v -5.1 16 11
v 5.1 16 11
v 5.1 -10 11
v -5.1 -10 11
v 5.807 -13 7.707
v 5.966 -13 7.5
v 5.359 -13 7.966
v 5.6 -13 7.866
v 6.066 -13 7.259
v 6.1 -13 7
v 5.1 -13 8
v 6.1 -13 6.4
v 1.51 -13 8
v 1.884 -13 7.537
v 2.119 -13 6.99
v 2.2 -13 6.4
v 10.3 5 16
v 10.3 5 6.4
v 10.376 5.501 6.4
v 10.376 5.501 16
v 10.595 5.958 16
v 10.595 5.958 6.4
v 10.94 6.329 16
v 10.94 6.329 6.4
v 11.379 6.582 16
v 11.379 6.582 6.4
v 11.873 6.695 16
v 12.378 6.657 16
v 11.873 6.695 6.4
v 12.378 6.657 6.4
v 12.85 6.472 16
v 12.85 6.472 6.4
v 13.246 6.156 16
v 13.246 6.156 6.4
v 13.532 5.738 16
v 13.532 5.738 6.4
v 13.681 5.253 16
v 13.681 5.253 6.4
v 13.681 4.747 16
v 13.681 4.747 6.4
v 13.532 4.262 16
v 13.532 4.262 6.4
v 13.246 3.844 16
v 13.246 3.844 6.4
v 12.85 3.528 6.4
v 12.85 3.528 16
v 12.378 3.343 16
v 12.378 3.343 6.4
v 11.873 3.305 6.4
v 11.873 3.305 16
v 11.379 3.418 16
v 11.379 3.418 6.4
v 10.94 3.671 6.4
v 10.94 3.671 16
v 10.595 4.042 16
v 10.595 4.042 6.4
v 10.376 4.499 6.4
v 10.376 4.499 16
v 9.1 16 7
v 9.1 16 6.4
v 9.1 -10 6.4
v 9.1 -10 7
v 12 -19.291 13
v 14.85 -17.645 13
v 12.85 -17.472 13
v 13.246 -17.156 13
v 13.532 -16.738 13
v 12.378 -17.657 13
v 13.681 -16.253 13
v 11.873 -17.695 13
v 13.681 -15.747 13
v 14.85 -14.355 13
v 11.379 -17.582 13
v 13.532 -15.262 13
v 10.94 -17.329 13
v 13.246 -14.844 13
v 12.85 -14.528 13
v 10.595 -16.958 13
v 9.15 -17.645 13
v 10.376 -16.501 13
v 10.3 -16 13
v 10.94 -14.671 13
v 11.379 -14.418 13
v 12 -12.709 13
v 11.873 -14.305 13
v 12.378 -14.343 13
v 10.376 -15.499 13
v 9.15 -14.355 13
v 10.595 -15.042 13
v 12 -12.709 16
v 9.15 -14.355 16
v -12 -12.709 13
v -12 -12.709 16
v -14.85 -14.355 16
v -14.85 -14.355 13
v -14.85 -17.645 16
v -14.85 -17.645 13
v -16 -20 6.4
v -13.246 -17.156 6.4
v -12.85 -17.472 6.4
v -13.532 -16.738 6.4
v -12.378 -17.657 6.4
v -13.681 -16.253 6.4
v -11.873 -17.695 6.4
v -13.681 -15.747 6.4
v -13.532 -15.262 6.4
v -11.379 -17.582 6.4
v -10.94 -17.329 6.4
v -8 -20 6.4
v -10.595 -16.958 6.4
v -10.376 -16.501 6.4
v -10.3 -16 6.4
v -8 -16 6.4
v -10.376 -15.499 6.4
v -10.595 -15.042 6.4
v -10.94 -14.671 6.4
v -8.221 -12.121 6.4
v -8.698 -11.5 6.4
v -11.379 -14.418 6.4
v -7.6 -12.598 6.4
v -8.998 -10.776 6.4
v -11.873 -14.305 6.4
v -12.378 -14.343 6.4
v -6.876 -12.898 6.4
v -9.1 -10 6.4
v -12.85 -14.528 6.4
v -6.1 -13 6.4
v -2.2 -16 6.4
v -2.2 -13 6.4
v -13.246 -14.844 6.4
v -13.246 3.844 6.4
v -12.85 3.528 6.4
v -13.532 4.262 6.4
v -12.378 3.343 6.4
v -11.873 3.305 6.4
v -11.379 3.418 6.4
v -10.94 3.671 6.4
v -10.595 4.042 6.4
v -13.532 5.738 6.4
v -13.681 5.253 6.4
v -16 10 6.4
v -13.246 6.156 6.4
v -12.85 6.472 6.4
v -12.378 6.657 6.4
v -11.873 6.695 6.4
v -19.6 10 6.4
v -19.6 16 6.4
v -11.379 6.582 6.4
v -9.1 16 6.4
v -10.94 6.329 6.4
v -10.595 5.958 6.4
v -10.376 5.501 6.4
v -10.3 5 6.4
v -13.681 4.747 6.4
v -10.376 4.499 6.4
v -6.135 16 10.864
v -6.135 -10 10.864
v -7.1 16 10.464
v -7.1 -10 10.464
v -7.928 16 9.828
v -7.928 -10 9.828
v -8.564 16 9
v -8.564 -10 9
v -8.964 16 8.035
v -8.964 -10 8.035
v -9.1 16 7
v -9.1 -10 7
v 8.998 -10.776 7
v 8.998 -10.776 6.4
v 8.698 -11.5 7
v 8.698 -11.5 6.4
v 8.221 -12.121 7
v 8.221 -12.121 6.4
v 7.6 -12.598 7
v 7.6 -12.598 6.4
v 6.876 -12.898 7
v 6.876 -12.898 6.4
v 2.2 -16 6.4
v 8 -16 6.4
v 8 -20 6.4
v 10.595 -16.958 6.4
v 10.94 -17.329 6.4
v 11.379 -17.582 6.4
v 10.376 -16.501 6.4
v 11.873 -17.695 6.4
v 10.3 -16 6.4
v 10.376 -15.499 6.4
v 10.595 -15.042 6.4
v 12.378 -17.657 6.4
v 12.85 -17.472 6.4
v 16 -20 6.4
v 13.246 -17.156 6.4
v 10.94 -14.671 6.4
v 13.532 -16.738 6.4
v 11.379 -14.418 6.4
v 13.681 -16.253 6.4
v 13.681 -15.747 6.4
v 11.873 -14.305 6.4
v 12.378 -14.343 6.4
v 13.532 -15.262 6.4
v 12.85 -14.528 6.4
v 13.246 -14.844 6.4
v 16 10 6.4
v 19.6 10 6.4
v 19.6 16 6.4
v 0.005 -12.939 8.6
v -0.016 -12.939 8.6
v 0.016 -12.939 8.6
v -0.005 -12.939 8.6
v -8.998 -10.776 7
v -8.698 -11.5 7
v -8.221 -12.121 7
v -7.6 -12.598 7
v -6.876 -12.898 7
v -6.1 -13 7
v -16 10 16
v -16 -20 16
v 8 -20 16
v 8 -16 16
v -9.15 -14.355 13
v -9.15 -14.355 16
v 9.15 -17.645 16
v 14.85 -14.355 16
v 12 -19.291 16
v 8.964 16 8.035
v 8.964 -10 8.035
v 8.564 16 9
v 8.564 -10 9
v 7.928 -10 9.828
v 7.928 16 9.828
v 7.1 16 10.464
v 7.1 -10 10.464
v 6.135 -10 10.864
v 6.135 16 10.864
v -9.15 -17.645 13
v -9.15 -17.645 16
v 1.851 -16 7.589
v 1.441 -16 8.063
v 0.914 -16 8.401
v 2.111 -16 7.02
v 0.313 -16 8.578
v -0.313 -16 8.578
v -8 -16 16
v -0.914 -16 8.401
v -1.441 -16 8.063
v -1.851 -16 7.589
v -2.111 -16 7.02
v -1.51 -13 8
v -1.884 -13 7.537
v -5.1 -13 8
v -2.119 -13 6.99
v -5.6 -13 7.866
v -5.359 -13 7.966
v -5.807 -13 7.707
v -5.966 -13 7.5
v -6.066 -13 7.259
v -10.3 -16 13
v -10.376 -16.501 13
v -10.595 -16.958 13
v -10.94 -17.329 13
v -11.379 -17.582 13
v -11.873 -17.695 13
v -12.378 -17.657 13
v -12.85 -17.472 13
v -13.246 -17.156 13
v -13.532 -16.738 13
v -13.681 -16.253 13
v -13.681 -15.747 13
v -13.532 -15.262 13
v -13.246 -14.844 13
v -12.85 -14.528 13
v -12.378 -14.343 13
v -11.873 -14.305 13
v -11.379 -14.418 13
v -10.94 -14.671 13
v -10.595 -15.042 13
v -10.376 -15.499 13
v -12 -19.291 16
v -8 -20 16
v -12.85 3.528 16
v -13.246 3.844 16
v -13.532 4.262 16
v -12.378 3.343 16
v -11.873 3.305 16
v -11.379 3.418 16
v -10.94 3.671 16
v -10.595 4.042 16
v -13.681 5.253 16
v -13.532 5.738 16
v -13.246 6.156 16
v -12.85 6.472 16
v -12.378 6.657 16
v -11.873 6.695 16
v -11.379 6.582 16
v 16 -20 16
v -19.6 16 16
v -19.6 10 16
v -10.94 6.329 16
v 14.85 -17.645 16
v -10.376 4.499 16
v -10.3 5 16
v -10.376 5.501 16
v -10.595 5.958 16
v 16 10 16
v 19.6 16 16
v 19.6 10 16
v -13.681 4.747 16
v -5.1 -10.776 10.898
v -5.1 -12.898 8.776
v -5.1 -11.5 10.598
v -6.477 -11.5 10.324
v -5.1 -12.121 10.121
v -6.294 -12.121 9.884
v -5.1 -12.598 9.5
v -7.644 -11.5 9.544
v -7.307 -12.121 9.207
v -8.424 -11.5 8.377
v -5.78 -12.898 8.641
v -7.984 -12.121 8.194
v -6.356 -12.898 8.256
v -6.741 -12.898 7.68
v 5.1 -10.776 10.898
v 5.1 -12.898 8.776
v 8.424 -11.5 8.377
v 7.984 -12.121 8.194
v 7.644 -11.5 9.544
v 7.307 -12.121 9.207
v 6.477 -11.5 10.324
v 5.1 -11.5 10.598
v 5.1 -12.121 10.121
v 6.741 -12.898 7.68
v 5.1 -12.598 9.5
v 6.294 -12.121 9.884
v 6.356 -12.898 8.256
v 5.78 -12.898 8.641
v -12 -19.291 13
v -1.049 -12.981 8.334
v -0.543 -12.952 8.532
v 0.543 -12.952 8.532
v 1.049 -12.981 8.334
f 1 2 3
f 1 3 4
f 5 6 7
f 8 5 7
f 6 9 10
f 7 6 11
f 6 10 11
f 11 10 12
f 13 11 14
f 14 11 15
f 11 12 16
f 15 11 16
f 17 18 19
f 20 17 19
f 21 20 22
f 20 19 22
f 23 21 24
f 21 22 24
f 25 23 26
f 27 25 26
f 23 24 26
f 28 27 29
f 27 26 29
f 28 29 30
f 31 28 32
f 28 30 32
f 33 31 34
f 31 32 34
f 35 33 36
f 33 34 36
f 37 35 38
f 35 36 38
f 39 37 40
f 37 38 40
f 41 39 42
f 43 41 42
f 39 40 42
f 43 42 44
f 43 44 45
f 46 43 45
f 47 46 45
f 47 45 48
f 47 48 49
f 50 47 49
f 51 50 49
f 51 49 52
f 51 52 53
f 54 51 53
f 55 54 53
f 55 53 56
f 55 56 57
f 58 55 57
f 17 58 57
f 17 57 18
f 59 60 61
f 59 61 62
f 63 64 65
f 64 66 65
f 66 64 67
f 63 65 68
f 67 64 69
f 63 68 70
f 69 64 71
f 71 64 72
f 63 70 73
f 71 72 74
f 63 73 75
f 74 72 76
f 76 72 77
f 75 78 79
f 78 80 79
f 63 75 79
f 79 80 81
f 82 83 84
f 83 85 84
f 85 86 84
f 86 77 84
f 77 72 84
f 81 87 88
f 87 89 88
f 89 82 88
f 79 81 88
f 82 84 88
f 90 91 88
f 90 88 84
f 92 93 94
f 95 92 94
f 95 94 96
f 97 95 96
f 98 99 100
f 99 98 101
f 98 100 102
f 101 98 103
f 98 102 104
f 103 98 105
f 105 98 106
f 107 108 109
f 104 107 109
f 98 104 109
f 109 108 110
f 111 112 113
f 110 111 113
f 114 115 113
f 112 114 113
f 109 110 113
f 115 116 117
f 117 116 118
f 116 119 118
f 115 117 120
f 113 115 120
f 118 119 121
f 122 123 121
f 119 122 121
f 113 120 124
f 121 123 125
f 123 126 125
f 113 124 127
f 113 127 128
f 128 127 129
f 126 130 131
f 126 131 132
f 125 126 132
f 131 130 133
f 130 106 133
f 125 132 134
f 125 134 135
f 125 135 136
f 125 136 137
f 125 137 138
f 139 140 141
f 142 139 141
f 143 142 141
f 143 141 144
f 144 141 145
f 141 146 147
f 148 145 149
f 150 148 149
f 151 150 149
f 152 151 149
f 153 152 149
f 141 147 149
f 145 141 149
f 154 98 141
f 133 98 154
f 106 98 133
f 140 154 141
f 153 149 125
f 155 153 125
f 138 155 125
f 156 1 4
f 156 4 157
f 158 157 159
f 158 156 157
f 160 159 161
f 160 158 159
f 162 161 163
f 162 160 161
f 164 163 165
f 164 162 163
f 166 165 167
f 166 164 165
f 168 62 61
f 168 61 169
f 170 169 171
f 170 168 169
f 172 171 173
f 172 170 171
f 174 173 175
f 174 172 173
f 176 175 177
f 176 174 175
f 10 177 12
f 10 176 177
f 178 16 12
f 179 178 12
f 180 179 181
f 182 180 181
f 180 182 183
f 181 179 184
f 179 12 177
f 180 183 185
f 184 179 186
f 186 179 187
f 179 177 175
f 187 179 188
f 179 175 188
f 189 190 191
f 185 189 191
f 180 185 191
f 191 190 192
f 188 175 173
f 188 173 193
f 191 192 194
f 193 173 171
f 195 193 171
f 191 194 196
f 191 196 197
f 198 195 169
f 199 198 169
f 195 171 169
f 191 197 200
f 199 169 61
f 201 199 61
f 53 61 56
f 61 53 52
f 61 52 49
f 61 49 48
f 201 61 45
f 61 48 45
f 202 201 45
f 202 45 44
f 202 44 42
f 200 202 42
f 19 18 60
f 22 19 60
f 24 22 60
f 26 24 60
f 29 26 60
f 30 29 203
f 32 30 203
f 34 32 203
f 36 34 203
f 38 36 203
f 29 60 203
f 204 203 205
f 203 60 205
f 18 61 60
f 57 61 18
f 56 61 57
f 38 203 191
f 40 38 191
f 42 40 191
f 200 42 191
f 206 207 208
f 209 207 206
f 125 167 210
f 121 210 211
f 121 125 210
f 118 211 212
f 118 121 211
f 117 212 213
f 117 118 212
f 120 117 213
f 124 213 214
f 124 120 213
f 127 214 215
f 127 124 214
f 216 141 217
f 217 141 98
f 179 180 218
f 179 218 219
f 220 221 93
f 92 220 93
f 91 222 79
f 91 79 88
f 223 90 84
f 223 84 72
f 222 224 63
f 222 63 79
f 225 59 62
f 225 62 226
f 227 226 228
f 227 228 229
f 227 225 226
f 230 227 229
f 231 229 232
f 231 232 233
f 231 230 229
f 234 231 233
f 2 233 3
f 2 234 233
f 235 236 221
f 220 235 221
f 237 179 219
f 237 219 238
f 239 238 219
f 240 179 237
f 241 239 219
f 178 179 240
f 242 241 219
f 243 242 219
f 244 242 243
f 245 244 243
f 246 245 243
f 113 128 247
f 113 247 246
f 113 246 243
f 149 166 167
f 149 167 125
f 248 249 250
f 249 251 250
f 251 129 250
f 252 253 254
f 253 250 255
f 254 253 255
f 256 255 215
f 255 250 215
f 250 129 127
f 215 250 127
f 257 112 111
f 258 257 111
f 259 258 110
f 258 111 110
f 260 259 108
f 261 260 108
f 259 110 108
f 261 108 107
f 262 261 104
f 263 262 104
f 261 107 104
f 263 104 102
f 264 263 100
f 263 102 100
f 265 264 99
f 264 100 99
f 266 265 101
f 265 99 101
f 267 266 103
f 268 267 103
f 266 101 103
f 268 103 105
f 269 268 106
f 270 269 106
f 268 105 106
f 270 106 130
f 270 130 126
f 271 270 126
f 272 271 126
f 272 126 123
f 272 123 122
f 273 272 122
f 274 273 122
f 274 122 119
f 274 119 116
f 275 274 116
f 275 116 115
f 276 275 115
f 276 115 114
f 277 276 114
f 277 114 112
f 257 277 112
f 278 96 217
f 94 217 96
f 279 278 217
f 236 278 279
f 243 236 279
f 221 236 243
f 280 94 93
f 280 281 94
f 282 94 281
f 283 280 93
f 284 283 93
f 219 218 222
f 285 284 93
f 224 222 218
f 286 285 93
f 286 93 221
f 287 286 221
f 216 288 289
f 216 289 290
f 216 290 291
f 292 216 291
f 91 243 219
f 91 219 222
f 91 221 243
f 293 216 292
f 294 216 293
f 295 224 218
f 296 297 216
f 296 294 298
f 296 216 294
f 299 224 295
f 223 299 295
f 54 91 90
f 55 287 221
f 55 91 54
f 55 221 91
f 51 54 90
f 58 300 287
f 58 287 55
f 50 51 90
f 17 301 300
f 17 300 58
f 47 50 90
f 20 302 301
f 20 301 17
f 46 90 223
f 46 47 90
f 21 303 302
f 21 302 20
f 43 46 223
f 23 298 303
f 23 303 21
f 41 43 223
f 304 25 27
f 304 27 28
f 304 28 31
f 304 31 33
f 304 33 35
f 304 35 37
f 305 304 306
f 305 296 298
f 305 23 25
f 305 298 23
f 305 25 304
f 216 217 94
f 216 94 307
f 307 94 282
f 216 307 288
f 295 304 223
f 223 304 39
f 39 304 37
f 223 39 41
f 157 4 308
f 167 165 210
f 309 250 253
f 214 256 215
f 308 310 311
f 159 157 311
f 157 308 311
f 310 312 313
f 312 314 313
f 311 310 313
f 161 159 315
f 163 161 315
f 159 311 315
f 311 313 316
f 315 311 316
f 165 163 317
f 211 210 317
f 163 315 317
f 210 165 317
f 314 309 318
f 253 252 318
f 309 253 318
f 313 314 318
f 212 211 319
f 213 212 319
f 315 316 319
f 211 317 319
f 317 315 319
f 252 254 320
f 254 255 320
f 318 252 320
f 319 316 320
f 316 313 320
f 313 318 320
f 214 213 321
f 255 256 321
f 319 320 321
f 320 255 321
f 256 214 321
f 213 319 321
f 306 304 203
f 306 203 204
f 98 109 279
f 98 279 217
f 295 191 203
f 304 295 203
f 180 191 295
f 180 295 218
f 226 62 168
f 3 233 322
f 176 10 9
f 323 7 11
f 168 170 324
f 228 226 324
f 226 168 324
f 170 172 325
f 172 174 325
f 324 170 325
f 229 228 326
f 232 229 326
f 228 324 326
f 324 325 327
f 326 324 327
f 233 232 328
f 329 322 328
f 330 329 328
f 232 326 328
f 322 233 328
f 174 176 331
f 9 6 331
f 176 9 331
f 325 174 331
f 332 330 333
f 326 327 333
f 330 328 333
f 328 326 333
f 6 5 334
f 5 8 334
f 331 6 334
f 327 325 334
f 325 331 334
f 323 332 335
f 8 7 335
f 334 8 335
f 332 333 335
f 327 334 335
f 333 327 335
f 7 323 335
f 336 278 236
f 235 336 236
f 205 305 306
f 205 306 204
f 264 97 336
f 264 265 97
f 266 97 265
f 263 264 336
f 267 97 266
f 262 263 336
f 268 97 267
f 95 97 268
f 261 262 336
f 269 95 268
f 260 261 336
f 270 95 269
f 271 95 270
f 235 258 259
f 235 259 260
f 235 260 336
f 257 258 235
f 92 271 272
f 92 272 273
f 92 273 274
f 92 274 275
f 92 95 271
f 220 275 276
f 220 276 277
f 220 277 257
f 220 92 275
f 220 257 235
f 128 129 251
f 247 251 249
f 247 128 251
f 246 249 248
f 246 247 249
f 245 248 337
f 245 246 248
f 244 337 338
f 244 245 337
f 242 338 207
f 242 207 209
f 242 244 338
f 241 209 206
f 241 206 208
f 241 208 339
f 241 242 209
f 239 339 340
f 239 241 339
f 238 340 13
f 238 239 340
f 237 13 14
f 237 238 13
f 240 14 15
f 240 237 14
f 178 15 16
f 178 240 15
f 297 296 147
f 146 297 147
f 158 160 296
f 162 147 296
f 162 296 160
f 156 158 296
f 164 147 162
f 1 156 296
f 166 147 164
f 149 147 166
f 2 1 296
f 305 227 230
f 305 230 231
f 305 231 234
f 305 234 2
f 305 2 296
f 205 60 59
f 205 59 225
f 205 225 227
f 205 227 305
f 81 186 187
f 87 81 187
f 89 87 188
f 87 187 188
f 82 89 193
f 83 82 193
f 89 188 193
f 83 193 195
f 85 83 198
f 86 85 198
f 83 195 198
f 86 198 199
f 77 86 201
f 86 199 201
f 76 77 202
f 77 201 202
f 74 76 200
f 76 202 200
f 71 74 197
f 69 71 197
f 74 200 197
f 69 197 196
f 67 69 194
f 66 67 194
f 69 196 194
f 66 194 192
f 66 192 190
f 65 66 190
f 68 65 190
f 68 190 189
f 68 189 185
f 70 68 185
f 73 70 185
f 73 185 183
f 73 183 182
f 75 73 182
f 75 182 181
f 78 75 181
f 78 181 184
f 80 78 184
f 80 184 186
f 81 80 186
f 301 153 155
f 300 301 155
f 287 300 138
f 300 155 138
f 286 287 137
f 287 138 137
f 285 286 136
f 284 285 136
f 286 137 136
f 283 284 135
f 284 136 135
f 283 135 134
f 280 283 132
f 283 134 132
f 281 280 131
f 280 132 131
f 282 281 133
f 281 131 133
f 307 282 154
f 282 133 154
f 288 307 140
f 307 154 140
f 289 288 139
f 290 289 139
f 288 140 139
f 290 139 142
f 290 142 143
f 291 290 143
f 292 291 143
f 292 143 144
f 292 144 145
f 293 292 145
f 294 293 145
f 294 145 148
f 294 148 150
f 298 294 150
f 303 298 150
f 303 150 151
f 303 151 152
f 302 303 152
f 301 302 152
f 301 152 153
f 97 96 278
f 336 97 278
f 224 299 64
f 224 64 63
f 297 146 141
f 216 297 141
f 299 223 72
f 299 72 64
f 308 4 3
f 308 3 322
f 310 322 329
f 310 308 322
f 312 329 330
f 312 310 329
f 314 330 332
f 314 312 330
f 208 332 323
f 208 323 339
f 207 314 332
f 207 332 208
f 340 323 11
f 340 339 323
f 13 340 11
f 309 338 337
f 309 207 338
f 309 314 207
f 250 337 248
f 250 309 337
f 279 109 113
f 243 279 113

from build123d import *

# Parameters (mm, degrees)
EXTRUDE_1_DEPTH     = 16
CUT_EXTRUDE_1_DEPTH = 29
FILLET_1_R          = 3
SKETCH_3_R          = 1.7
CUT_EXTRUDE_2_DEPTH = 16
SKETCH_4_R          = 2.2
CUT_EXTRUDE_3_DEPTH = 3.0606
CUT_EXTRUDE_4_DEPTH = 3
EXTRUDE_START       = 13
SKETCH_6_W          = 8
SKETCH_6_H          = 8
SKETCH_6_R          = 1.7
EXTRUDE_2_DEPTH     = 13
SKETCH_8_W          = 39.2
SKETCH_8_H          = 19.2
EXTRUDE_3_DEPTH     = 6
SKETCH_9_W          = 41.779638264
SKETCH_9_H          = 22.131707322
CUT_EXTRUDE_5_DEPTH = 45.001818144


with BuildPart() as part:
    # Эскиз1 → Бобышка-Вытянуть1 (new body)
    with BuildSketch(Plane.XY):
        Polygon((8, -16), (-8, -16), (-8, -20), (-16, -20), (-16, -16), (-16, 16), (16, 16), (16, -16), (16, -20), (8, -20), align=None)
    extrude(amount=EXTRUDE_1_DEPTH)

    # Эскиз2 → Вырез-Вытянуть1 (cut)
    with BuildSketch(Plane(origin=(0, 16, 0), x_dir=(1, 0, 0), z_dir=(0, 1, 0))):
        with BuildLine():
            Line((5.1, -11), (-5.1, -11))
            ThreePointArc((-5.1, -11), (-7.928427125, -9.828427125), (-9.1, -7))
            Line((-9.1, -7), (-9.1, -5.8))
            ThreePointArc((-9.1, -5.8), (-7.928427125, -2.971572875), (-5.1, -1.8))
            Line((-5.1, -1.8), (5.1, -1.8))
            ThreePointArc((5.1, -1.8), (7.928427125, -2.971572875), (9.1, -5.8))
            Line((9.1, -5.8), (9.1, -7))
            ThreePointArc((9.1, -7), (7.928427125, -9.828427125), (5.1, -11))
        make_face()
    extrude(amount=-CUT_EXTRUDE_1_DEPTH, mode=Mode.SUBTRACT)

    # Скругление1
    fillet_1_edges = [part.edges().sort_by_distance(p)[0] for p in [
        (7.928427125, -13, 2.971572875),
        (9.1, -13, 6.4),
        (7.928427125, -13, 9.828427125),
        (0, -13, 11),
        (-7.928427125, -13, 9.828427125),
        (-9.1, -13, 6.4),
        (-7.928427125, -13, 2.971572875),
        (0, -13, 1.8),
    ]]
    fillet(fillet_1_edges, radius=FILLET_1_R)

    # Эскиз3 → Вырез-Вытянуть2 (cut)
    with BuildSketch(Plane(origin=(0, 0, 0), x_dir=(-1, 0, 0), z_dir=(0, 0, -1))):
        with Locations((-12, -16)):
            Circle(SKETCH_3_R)
        with Locations((-12, 5)):
            Circle(SKETCH_3_R)
        with Locations(Location((12, 5, 0), (0, 0, 180))):
            Circle(SKETCH_3_R)
        with Locations(Location((12, -16, 0), (0, 0, 180))):
            Circle(SKETCH_3_R)
    extrude(amount=-CUT_EXTRUDE_2_DEPTH, mode=Mode.SUBTRACT)

    # Эскиз4 → Вырез-Вытянуть3 (cut)
    with BuildSketch(Plane(origin=(0, -16, 0), x_dir=(1, 0, 0), z_dir=(0, 1, 0))):
        with Locations(Location((0, -6.4, 0), (0, 0, 133.341758227))):
            Circle(SKETCH_4_R)
    extrude(amount=CUT_EXTRUDE_3_DEPTH, mode=Mode.SUBTRACT)

    # Эскиз5 → Вырез-Вытянуть4 (cut)
    with BuildSketch(Plane.XY.offset(16)):
        Polygon((-12, -12.709103466), (-14.85, -14.354551733), (-14.85, -17.645448267), (-12, -19.290896534), (-9.15, -17.645448267), (-9.15, -14.354551733), align=None)
        Polygon((9.15, -14.354551733), (12, -12.709103466), (14.85, -14.354551733), (14.85, -17.645448267), (12, -19.290896534), (9.15, -17.645448267), align=None)
    extrude(amount=-CUT_EXTRUDE_4_DEPTH, mode=Mode.SUBTRACT)

    # Эскиз6 → Бобышка-Вытянуть2 (add)
    # profile 1 of 2: a face of its own
    with BuildSketch(Plane(origin=(0, 0, 0), x_dir=(-1, 0, 0), z_dir=(0, 0, -1)).offset(EXTRUDE_START)):
        with Locations((-12, -16)):
            Rectangle(SKETCH_6_W, SKETCH_6_H)
        with Locations((-12, -16)):
            Circle(SKETCH_6_R, mode=Mode.SUBTRACT)
    # profile 2 of 2: a face of its own
    with BuildSketch(Plane(origin=(0, 0, 0), x_dir=(-1, 0, 0), z_dir=(0, 0, -1)).offset(EXTRUDE_START)):
        with Locations((12, -16)):
            Rectangle(SKETCH_6_W, SKETCH_6_H)
        with Locations(Location((12, -16, 0), (0, 0, 180))):
            Circle(SKETCH_6_R, mode=Mode.SUBTRACT)
    extrude(amount=-EXTRUDE_2_DEPTH)

    # Эскиз8 → Бобышка-Вытянуть3 (add)
    with BuildSketch(Plane(origin=(0, 16, 0), x_dir=(1, 0, 0), z_dir=(0, 1, 0))):
        with Locations((0, -6.4)):
            Rectangle(SKETCH_8_W, SKETCH_8_H)
        with BuildLine():
            Line((-9.1, -5.8), (-9.1, -7))
            ThreePointArc((-9.1, -7), (-7.928427125, -9.828427125), (-5.1, -11))
            Line((-5.1, -11), (5.1, -11))
            ThreePointArc((5.1, -11), (7.928427125, -9.828427125), (9.1, -7))
            Line((9.1, -7), (9.1, -5.8))
            ThreePointArc((9.1, -5.8), (7.928427125, -2.971572875), (5.1, -1.8))
            Line((5.1, -1.8), (-5.1, -1.8))
            ThreePointArc((-5.1, -1.8), (-7.928427125, -2.971572875), (-9.1, -5.8))
        make_face(mode=Mode.SUBTRACT)
    extrude(amount=-EXTRUDE_3_DEPTH)

    # Эскиз9 → Вырез-Вытянуть5 (cut, through all)
    with BuildSketch(Plane(origin=(0, 16, 0), x_dir=(1, 0, 0), z_dir=(0, 1, 0))):
        with Locations((1.289819132, 4.665853661)):
            Rectangle(SKETCH_9_W, SKETCH_9_H)
    extrude(amount=-CUT_EXTRUDE_5_DEPTH, mode=Mode.SUBTRACT)


solid = part.part
